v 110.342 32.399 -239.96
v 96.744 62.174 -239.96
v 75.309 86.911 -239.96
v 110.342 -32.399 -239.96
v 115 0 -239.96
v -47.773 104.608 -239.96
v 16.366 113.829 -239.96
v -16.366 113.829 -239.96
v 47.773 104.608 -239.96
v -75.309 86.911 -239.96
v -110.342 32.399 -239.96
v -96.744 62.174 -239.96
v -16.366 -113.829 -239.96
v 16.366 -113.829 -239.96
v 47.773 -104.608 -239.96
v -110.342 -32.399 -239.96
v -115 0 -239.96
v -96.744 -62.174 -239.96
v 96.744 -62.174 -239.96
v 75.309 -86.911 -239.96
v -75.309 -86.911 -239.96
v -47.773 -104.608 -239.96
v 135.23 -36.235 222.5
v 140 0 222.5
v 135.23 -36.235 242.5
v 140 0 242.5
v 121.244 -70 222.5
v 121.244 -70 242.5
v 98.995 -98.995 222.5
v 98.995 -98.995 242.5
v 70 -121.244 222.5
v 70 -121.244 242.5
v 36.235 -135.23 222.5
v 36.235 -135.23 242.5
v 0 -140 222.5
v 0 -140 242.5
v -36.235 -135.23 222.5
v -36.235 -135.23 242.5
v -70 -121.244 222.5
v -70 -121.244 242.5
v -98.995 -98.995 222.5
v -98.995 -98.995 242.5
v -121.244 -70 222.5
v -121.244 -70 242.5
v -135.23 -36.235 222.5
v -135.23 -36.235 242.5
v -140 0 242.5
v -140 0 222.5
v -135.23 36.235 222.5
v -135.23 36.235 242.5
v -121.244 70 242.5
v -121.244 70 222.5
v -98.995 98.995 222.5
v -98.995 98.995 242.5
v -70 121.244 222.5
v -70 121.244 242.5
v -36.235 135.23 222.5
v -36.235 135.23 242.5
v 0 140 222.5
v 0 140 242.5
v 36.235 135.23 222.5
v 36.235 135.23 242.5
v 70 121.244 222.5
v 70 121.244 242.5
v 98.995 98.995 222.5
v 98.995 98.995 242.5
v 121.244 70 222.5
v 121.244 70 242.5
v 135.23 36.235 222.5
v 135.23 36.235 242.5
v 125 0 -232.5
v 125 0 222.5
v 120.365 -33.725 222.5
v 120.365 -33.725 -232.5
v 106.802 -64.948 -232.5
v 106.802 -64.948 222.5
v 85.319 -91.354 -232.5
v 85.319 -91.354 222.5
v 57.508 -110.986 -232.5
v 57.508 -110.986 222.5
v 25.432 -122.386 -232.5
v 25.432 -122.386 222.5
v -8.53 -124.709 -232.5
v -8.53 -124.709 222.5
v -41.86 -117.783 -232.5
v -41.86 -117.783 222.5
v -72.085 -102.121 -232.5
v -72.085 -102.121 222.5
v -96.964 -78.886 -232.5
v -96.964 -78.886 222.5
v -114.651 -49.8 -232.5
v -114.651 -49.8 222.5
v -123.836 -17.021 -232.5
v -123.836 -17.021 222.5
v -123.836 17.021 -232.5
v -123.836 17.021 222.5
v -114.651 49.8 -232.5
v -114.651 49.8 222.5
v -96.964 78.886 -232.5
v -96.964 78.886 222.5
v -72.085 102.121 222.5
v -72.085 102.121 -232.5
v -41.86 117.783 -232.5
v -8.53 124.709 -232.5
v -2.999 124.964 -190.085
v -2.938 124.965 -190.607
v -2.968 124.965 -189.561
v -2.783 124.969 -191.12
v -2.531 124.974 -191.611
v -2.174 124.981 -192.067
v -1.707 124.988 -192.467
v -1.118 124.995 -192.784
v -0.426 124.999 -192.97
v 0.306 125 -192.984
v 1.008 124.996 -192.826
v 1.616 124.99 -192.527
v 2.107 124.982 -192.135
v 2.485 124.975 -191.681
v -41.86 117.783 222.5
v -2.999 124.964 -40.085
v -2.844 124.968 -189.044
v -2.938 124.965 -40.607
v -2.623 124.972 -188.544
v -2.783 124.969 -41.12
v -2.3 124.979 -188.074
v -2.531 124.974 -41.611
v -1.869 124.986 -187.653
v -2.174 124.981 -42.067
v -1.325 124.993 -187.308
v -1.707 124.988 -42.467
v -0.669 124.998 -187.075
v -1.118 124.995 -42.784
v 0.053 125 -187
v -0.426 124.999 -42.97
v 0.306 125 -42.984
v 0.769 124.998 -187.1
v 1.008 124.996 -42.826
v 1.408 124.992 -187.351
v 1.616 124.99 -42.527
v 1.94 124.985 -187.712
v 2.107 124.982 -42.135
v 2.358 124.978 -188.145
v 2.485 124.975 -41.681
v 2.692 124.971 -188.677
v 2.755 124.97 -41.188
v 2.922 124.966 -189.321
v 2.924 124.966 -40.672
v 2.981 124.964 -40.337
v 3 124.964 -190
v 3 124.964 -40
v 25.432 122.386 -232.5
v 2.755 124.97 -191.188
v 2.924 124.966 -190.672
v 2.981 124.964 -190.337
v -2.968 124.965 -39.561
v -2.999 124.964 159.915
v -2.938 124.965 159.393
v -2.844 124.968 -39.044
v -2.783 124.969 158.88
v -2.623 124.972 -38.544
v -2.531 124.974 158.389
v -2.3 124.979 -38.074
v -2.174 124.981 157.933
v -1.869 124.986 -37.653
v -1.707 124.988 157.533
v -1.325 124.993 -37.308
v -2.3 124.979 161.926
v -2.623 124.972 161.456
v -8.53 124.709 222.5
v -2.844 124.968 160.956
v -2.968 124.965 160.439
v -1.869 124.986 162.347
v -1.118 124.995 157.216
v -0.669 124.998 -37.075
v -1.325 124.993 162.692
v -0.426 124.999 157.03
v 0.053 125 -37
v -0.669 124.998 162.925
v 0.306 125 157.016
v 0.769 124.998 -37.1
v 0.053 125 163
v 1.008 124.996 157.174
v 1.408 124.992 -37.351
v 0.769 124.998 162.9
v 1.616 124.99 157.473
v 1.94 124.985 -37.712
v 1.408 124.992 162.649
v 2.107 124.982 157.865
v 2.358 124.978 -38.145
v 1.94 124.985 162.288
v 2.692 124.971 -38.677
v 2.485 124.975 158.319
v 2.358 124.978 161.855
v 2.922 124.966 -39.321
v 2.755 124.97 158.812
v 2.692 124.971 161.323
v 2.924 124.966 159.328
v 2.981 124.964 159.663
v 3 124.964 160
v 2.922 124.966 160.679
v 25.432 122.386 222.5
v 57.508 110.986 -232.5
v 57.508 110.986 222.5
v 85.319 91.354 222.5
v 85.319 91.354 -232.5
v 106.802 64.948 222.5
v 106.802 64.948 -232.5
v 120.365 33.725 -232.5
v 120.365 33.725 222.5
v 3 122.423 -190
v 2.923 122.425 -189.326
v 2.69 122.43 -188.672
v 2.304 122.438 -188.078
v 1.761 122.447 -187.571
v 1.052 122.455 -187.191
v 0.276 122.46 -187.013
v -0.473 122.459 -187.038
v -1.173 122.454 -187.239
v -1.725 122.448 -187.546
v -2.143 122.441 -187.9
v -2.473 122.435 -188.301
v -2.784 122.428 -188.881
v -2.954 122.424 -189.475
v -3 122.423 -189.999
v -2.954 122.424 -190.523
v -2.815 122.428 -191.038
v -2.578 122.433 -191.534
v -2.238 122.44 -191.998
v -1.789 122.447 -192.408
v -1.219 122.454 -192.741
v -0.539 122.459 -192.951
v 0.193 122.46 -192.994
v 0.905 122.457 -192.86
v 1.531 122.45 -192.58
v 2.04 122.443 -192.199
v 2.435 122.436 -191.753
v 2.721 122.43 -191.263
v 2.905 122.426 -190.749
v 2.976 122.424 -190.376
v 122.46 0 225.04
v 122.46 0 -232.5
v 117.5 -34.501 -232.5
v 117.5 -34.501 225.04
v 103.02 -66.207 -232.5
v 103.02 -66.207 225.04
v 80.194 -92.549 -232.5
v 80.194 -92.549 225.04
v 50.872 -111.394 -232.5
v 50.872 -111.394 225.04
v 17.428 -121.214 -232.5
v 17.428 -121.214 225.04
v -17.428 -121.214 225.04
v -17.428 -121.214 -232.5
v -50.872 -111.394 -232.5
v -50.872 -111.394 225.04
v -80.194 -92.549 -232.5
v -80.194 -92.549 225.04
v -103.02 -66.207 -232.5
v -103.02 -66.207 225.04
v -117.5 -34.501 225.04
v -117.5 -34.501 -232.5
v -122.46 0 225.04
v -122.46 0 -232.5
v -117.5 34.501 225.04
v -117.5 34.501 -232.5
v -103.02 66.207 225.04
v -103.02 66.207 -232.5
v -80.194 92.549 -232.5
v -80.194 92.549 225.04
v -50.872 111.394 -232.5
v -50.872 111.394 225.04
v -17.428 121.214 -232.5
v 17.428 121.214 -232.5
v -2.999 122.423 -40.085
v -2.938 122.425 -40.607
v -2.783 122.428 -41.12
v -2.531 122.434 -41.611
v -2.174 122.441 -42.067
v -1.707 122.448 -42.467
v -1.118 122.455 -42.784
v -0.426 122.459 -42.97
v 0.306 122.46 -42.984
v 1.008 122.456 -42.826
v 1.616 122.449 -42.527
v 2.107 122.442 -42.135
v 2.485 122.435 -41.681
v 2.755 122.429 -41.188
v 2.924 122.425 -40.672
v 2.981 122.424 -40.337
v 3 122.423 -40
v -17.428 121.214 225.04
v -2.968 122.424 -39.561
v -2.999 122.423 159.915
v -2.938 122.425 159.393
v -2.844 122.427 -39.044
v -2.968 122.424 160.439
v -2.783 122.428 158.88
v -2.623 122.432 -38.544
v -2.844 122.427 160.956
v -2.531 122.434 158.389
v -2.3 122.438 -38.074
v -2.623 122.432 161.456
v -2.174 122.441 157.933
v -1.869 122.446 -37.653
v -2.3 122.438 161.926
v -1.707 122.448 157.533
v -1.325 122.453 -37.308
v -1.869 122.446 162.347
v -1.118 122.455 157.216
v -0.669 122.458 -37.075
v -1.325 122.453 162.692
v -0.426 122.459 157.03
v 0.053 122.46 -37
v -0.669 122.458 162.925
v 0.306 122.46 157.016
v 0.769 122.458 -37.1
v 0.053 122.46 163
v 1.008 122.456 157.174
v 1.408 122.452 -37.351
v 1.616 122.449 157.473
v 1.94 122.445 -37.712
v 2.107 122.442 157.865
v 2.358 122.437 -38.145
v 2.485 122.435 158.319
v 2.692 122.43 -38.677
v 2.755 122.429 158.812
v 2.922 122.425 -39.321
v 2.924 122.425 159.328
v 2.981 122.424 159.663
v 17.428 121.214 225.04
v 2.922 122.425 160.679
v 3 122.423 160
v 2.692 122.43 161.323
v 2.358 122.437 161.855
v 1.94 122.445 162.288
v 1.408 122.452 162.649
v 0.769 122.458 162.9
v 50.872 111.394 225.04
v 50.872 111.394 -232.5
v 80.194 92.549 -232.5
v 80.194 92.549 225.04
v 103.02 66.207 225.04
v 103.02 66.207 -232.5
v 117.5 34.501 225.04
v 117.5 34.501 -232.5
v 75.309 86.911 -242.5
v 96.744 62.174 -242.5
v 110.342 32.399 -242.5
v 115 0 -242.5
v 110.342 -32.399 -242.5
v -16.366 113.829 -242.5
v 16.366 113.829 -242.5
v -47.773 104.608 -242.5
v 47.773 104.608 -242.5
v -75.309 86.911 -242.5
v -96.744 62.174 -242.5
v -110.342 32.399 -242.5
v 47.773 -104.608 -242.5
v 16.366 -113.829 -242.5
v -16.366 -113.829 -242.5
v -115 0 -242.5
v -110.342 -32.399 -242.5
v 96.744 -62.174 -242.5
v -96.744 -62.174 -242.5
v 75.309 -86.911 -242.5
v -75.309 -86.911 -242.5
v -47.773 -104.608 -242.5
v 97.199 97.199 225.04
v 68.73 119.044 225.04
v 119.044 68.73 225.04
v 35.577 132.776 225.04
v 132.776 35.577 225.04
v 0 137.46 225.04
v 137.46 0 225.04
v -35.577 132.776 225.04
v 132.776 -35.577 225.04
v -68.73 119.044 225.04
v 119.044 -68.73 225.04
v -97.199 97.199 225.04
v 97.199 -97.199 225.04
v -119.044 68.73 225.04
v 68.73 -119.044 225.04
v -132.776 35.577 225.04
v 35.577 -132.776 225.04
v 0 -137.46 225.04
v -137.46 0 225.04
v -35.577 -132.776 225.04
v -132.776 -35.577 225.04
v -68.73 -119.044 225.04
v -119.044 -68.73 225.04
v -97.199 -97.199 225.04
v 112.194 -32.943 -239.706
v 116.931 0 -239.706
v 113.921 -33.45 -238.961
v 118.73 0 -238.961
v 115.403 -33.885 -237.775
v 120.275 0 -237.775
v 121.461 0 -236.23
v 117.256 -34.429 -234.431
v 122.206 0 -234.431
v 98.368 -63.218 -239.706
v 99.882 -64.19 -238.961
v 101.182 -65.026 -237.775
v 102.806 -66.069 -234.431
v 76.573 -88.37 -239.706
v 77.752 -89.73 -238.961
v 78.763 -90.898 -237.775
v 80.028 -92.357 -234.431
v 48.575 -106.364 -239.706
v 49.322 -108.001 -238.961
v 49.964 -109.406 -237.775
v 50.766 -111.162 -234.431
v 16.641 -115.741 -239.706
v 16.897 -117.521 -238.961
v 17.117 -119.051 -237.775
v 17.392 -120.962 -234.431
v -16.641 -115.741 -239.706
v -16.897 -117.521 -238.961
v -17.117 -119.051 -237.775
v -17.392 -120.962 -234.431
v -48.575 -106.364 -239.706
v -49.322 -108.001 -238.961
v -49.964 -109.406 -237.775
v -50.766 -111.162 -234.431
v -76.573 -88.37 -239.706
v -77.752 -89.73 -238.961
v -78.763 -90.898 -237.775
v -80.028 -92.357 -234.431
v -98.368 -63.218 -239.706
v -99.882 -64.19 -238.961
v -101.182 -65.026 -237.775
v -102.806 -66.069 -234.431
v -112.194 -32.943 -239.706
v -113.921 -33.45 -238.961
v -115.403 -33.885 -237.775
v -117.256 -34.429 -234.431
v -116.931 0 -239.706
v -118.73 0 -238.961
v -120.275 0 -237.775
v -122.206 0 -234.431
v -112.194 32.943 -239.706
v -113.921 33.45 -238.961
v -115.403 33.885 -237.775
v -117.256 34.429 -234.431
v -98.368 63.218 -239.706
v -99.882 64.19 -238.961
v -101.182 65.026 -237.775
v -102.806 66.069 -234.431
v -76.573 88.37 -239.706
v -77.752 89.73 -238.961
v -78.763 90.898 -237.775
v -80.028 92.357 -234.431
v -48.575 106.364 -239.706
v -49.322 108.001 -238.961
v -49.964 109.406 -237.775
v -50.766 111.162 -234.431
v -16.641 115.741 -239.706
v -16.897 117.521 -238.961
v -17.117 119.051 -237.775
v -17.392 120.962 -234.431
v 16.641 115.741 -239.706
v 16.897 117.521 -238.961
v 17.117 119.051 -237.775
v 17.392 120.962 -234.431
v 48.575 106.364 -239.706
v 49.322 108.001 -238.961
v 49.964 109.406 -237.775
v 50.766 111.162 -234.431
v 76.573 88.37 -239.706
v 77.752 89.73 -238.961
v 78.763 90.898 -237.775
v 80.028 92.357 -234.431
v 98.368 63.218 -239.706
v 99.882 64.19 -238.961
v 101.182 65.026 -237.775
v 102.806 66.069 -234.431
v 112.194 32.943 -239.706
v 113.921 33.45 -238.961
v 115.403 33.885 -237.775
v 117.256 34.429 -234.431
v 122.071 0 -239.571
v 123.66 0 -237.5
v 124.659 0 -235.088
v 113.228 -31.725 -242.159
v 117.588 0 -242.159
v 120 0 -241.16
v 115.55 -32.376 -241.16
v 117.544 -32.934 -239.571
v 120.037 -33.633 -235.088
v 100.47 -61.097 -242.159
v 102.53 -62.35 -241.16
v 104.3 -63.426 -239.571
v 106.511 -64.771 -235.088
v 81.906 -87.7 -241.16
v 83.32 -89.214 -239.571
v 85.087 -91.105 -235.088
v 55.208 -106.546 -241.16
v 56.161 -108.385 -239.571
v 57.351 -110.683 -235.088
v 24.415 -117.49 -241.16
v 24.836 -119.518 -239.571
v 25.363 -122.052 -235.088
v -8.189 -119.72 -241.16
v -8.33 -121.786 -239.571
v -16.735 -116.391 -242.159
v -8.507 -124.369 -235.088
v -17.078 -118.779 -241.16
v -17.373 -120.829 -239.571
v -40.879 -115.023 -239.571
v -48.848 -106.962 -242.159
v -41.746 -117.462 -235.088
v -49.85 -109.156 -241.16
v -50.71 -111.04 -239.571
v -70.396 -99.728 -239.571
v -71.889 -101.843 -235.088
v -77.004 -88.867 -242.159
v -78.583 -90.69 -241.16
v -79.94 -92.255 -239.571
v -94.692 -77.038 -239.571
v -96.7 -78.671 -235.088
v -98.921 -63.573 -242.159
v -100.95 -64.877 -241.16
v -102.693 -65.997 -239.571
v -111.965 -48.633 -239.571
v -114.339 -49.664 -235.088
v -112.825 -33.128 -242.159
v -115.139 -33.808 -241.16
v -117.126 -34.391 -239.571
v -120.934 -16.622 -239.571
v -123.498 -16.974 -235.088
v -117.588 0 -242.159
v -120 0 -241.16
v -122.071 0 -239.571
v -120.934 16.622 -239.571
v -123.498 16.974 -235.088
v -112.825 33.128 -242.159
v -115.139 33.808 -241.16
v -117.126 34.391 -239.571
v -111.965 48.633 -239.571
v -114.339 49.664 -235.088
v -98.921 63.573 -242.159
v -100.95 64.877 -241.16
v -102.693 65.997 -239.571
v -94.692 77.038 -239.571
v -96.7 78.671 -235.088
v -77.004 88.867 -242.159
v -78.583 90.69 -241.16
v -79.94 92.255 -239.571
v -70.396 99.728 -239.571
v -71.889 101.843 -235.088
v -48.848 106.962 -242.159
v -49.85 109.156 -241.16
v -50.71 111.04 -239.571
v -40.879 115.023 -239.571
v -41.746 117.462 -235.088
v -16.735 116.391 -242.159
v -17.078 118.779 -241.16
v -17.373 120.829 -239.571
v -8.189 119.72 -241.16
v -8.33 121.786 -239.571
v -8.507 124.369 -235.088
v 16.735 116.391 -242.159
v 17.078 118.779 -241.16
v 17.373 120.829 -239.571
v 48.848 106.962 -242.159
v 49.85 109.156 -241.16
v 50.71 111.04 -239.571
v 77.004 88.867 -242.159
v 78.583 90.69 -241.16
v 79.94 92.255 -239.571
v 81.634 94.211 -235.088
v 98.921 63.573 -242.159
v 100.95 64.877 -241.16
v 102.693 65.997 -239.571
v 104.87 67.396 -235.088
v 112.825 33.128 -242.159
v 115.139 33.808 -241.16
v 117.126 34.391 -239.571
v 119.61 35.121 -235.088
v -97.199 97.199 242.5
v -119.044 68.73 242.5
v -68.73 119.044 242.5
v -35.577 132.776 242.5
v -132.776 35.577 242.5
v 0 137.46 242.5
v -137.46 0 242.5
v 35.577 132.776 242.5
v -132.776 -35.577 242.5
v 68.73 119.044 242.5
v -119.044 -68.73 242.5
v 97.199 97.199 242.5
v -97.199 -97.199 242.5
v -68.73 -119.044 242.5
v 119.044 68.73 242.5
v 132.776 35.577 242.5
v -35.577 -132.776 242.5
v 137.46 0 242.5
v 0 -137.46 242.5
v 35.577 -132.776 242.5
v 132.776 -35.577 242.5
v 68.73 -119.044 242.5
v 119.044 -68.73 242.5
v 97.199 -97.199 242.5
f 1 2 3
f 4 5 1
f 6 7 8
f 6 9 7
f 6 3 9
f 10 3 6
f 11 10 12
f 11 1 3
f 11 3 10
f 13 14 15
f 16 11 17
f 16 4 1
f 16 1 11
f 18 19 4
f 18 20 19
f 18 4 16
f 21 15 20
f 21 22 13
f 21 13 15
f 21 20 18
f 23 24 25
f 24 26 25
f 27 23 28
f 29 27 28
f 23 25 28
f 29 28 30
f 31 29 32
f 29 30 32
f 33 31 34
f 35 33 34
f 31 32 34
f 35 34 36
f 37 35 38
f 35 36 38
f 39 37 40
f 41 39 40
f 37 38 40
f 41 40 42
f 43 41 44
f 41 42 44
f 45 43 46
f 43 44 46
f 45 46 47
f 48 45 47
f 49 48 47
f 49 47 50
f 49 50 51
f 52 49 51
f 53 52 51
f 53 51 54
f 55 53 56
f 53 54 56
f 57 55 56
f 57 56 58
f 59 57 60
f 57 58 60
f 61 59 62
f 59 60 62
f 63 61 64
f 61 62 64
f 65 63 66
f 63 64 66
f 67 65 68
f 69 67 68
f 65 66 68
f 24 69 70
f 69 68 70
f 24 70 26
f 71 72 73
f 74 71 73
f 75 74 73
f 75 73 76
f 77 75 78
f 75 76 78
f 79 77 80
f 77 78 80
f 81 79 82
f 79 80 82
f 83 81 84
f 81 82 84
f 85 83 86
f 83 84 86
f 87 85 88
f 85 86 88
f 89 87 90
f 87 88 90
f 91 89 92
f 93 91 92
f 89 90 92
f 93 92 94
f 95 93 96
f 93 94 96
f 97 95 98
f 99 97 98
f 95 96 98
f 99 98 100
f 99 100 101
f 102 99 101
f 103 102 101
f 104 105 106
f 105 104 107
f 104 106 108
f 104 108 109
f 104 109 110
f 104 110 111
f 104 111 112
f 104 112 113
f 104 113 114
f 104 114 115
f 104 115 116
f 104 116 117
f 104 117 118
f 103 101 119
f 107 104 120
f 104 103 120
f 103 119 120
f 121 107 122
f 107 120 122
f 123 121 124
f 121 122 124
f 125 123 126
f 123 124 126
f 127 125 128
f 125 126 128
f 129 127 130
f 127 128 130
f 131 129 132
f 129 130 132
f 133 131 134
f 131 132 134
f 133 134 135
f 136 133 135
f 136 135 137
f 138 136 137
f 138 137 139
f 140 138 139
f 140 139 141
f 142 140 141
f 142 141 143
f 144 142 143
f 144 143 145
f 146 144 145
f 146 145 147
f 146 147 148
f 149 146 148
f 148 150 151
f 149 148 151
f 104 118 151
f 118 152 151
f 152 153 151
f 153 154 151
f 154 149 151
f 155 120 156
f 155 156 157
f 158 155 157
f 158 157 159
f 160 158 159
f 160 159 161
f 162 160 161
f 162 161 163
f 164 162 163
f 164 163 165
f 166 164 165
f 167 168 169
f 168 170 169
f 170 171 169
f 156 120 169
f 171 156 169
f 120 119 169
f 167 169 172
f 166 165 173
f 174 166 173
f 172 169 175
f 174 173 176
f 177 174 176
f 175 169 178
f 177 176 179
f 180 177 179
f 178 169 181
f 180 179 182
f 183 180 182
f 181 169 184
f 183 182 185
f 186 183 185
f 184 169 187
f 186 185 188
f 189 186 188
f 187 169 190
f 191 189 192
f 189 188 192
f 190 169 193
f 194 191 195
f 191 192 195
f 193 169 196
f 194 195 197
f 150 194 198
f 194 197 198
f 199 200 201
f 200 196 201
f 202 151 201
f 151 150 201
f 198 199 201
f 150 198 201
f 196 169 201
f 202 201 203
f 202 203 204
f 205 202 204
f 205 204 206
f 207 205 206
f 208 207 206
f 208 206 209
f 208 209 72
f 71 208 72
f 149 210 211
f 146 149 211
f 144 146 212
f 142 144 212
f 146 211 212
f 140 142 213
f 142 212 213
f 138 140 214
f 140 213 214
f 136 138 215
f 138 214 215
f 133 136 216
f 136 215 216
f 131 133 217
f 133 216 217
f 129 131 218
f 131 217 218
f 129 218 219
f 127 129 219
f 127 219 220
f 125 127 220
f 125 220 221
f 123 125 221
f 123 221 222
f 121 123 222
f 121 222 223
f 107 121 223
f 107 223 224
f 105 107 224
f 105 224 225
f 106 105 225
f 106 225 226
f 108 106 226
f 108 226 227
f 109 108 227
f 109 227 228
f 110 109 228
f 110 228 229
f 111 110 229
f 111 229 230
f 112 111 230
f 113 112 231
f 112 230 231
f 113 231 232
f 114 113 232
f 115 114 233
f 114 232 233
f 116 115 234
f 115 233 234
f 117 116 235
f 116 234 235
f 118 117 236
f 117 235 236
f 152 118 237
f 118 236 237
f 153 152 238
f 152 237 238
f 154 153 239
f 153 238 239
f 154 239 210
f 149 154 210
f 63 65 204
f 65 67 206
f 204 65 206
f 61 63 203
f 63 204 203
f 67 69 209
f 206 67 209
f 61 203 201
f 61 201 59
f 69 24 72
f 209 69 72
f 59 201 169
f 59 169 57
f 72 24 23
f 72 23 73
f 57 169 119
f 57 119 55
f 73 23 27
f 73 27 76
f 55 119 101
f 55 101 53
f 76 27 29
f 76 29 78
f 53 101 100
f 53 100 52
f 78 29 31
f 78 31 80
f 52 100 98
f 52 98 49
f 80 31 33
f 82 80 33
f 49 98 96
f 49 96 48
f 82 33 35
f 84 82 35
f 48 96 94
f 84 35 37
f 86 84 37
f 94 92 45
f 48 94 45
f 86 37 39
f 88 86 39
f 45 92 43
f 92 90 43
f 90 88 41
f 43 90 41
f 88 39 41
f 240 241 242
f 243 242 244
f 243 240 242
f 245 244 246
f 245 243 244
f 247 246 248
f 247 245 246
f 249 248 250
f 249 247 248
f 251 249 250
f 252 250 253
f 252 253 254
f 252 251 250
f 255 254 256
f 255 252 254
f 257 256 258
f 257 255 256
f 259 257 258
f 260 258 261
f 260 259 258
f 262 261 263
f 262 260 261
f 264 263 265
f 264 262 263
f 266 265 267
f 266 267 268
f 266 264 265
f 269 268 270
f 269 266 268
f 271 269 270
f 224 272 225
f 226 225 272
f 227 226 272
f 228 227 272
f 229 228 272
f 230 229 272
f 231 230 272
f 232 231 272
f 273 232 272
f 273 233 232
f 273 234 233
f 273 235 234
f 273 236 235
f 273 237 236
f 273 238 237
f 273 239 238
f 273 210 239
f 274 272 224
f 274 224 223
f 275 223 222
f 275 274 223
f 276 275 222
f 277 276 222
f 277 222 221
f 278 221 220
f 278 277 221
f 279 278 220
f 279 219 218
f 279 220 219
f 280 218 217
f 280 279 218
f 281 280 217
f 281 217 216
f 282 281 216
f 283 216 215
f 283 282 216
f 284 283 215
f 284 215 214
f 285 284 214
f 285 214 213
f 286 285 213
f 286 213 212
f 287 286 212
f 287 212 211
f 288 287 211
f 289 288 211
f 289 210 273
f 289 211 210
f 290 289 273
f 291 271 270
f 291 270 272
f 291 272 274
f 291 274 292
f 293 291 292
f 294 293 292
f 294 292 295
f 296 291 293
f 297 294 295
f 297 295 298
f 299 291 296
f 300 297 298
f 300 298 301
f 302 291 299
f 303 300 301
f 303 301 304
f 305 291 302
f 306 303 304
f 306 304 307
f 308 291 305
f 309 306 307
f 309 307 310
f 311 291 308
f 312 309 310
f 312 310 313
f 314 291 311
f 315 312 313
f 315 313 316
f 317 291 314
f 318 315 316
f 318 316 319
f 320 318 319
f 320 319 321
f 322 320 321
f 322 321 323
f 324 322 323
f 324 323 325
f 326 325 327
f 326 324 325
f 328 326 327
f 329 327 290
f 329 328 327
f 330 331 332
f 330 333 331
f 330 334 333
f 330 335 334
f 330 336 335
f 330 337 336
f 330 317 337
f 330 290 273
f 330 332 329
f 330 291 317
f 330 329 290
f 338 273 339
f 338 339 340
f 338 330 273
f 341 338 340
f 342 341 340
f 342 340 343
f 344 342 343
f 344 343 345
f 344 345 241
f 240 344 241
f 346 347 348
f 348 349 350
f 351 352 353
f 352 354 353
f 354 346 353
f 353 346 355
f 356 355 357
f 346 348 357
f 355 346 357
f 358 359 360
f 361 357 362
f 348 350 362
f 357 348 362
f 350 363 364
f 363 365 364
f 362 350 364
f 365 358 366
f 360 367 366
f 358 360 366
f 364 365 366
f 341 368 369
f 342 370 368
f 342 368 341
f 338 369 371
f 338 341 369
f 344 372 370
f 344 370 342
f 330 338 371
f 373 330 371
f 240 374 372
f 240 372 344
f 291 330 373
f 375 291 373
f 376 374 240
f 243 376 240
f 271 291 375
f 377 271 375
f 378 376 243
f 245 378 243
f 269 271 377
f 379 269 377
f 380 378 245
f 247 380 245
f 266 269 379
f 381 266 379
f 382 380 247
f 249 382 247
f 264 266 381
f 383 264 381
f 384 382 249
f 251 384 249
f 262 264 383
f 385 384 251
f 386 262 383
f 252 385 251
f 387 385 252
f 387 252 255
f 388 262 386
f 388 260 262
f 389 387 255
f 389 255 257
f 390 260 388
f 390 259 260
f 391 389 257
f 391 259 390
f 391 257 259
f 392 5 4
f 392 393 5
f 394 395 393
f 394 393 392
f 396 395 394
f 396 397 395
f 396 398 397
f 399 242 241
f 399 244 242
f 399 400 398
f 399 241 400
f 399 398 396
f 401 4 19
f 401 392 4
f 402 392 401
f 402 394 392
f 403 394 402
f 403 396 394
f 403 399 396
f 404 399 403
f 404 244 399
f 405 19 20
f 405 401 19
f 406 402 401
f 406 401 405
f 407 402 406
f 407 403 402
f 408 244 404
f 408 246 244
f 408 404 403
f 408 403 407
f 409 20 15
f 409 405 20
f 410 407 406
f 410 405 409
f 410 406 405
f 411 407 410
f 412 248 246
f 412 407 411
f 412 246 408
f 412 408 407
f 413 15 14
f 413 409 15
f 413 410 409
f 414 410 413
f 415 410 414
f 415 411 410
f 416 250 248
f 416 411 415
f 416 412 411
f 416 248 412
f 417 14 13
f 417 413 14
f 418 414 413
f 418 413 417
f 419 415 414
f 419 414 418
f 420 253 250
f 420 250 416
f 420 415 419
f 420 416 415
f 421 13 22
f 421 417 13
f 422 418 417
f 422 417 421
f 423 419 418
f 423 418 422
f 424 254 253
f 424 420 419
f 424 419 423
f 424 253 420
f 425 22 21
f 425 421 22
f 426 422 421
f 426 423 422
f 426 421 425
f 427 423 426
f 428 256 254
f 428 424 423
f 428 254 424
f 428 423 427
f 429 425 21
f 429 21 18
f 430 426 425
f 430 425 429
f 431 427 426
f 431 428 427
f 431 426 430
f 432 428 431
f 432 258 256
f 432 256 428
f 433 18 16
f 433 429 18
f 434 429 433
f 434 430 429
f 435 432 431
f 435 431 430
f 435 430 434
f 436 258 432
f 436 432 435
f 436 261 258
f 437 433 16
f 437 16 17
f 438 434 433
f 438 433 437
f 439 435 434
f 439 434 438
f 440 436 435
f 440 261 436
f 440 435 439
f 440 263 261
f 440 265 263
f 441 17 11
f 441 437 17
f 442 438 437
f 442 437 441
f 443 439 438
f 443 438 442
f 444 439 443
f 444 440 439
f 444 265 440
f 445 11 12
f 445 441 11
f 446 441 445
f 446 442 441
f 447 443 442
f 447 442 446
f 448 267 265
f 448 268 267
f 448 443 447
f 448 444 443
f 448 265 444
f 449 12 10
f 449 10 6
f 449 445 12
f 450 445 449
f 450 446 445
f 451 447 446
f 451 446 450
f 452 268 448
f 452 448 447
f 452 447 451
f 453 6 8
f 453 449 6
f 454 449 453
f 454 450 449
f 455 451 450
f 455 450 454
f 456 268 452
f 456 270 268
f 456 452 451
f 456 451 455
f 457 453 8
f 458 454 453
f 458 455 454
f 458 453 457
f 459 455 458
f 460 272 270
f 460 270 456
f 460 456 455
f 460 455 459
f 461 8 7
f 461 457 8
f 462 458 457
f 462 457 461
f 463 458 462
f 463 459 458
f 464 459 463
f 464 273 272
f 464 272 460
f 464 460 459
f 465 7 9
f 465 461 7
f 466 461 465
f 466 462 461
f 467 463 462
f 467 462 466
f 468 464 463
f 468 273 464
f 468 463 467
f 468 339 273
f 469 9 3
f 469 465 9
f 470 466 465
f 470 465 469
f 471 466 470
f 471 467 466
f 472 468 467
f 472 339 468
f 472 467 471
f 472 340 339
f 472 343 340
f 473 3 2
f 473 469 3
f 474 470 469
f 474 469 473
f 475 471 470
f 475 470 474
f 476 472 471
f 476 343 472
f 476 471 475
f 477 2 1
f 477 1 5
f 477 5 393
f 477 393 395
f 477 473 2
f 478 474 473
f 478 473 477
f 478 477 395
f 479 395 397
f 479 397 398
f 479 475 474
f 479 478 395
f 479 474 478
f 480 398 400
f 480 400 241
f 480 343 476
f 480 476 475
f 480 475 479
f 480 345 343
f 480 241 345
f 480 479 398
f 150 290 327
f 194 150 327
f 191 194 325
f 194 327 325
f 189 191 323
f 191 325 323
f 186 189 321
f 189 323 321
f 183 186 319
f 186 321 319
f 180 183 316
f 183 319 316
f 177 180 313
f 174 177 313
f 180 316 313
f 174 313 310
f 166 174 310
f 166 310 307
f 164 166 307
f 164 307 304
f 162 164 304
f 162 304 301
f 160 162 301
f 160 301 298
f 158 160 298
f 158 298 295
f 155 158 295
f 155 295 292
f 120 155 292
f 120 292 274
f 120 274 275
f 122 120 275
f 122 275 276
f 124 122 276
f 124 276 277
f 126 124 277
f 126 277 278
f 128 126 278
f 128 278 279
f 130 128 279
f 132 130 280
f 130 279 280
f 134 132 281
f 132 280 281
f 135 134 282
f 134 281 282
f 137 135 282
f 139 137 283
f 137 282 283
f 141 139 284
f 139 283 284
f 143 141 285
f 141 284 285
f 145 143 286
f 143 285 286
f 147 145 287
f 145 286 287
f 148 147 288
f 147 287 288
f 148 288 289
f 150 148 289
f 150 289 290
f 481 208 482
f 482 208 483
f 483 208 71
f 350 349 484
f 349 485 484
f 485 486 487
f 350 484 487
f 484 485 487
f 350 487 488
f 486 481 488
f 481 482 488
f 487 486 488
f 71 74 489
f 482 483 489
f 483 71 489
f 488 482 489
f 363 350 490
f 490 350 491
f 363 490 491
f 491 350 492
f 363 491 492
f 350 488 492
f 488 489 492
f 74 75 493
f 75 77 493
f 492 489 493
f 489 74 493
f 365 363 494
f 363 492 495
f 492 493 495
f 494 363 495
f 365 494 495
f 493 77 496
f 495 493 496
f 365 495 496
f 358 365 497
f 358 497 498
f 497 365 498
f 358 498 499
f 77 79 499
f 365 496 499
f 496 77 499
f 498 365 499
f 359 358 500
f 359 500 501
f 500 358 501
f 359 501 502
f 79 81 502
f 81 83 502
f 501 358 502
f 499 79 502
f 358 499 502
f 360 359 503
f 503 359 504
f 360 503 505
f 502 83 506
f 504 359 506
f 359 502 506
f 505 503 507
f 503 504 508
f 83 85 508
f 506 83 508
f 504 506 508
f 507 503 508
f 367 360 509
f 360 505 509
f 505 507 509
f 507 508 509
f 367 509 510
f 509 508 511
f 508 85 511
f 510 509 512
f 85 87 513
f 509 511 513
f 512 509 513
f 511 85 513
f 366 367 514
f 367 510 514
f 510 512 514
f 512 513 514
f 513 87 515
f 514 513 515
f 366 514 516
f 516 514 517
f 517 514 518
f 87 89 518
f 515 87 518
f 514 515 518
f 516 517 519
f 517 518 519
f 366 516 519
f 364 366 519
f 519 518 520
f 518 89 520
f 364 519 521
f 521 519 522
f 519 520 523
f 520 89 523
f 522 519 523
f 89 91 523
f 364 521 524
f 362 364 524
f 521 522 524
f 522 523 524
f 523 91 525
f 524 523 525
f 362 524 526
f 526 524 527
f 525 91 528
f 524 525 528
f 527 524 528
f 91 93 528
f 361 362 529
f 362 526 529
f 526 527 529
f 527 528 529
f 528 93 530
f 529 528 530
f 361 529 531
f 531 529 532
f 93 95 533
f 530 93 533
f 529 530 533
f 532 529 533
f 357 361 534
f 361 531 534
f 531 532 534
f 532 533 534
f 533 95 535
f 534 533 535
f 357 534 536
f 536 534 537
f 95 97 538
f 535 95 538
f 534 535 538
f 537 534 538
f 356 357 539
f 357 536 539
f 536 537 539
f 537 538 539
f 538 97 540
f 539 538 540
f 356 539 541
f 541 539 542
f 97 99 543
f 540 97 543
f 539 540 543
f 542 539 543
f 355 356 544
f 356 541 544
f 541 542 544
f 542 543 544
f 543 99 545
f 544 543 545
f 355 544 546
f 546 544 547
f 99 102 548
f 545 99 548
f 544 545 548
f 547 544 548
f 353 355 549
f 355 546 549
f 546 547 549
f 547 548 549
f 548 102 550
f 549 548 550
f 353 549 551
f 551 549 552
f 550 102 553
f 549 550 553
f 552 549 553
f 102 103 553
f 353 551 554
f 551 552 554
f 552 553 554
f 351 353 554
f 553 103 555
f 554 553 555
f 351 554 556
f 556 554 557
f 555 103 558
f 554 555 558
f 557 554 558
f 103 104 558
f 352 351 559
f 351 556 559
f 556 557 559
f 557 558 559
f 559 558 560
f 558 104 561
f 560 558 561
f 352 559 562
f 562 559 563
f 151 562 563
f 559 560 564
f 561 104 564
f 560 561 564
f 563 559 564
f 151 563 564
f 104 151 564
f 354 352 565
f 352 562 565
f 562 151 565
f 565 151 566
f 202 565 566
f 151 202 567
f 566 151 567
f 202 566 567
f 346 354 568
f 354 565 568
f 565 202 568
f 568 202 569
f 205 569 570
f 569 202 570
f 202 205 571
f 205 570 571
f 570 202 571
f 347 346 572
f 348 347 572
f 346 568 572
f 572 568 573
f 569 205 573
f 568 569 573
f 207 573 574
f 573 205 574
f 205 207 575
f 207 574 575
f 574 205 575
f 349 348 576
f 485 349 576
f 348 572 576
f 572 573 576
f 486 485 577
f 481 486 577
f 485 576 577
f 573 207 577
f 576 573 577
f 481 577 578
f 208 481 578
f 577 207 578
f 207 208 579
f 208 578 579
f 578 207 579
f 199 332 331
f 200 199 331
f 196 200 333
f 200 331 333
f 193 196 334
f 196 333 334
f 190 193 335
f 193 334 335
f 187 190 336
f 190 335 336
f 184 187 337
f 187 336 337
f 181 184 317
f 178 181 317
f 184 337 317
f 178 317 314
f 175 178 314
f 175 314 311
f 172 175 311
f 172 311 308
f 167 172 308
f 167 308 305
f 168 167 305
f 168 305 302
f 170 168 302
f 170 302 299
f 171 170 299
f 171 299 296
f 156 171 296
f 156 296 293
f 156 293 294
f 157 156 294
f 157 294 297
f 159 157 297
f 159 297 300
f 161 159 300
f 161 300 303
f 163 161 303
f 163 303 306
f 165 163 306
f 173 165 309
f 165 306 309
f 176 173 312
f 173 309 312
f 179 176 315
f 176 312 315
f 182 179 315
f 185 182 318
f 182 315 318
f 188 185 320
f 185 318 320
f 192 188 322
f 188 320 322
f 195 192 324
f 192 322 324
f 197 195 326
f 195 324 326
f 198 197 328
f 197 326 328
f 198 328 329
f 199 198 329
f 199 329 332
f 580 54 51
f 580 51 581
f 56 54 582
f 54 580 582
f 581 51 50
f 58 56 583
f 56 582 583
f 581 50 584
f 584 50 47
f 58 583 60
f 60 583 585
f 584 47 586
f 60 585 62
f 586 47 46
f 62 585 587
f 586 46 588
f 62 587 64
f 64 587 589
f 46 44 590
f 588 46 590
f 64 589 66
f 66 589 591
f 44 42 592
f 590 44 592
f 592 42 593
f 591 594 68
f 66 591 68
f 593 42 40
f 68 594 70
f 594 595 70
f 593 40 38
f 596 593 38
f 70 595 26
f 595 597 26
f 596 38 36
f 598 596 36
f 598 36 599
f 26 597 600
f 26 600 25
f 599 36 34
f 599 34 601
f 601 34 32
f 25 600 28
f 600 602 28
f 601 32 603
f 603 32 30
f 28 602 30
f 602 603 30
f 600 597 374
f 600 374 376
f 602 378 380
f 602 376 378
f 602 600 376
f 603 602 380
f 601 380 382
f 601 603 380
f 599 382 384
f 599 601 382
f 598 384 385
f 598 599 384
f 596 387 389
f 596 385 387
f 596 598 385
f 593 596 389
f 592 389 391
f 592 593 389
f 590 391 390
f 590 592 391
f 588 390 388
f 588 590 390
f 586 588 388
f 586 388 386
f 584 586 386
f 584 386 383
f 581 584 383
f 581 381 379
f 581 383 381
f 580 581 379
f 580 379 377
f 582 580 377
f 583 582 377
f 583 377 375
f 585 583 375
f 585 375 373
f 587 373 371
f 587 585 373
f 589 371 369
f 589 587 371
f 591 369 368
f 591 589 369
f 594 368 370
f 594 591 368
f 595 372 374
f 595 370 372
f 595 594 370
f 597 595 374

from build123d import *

# Parameters (mm, degrees)
F2_T     = -2.54
F3_R     = 3
F4_DEPTH = 140.001


with BuildPart() as f1:
    # F0 (on Front) → F1 (revolve)
    with BuildSketch(Plane.XZ):
        with BuildLine():
            Line((0, 242.5), (0, -242.5))
            Line((0, -242.5), (115, -242.5))
            ThreePointArc((115, -242.5), (122.0710678119, -239.5710678119), (125, -232.5))
            Line((125, -232.5), (125, 222.5))
            Line((125, 222.5), (140, 222.5))
            Line((140, 222.5), (140, 242.5))
            Line((140, 242.5), (0, 242.5))
        make_face()
    revolve(axis=Axis((0, 0, 0), (0, 0, -1)))

    # F2
    f2_openings = [f1.faces().sort_by_distance(p)[0] for p in [
        (0, 0, 242.5),
    ]]
    offset(amount=F2_T, openings=f2_openings, kind=Kind.INTERSECTION)

    # F3 (on Front) → F4 (cut, through all)
    with BuildSketch(Plane.XZ):
        with Locations((0, 160)):
            Circle(F3_R)
        with Locations((0, -40)):
            Circle(F3_R)
        with Locations((0, -190)):
            Circle(F3_R)
    extrude(amount=-F4_DEPTH, mode=Mode.SUBTRACT)


solid = f1.part
